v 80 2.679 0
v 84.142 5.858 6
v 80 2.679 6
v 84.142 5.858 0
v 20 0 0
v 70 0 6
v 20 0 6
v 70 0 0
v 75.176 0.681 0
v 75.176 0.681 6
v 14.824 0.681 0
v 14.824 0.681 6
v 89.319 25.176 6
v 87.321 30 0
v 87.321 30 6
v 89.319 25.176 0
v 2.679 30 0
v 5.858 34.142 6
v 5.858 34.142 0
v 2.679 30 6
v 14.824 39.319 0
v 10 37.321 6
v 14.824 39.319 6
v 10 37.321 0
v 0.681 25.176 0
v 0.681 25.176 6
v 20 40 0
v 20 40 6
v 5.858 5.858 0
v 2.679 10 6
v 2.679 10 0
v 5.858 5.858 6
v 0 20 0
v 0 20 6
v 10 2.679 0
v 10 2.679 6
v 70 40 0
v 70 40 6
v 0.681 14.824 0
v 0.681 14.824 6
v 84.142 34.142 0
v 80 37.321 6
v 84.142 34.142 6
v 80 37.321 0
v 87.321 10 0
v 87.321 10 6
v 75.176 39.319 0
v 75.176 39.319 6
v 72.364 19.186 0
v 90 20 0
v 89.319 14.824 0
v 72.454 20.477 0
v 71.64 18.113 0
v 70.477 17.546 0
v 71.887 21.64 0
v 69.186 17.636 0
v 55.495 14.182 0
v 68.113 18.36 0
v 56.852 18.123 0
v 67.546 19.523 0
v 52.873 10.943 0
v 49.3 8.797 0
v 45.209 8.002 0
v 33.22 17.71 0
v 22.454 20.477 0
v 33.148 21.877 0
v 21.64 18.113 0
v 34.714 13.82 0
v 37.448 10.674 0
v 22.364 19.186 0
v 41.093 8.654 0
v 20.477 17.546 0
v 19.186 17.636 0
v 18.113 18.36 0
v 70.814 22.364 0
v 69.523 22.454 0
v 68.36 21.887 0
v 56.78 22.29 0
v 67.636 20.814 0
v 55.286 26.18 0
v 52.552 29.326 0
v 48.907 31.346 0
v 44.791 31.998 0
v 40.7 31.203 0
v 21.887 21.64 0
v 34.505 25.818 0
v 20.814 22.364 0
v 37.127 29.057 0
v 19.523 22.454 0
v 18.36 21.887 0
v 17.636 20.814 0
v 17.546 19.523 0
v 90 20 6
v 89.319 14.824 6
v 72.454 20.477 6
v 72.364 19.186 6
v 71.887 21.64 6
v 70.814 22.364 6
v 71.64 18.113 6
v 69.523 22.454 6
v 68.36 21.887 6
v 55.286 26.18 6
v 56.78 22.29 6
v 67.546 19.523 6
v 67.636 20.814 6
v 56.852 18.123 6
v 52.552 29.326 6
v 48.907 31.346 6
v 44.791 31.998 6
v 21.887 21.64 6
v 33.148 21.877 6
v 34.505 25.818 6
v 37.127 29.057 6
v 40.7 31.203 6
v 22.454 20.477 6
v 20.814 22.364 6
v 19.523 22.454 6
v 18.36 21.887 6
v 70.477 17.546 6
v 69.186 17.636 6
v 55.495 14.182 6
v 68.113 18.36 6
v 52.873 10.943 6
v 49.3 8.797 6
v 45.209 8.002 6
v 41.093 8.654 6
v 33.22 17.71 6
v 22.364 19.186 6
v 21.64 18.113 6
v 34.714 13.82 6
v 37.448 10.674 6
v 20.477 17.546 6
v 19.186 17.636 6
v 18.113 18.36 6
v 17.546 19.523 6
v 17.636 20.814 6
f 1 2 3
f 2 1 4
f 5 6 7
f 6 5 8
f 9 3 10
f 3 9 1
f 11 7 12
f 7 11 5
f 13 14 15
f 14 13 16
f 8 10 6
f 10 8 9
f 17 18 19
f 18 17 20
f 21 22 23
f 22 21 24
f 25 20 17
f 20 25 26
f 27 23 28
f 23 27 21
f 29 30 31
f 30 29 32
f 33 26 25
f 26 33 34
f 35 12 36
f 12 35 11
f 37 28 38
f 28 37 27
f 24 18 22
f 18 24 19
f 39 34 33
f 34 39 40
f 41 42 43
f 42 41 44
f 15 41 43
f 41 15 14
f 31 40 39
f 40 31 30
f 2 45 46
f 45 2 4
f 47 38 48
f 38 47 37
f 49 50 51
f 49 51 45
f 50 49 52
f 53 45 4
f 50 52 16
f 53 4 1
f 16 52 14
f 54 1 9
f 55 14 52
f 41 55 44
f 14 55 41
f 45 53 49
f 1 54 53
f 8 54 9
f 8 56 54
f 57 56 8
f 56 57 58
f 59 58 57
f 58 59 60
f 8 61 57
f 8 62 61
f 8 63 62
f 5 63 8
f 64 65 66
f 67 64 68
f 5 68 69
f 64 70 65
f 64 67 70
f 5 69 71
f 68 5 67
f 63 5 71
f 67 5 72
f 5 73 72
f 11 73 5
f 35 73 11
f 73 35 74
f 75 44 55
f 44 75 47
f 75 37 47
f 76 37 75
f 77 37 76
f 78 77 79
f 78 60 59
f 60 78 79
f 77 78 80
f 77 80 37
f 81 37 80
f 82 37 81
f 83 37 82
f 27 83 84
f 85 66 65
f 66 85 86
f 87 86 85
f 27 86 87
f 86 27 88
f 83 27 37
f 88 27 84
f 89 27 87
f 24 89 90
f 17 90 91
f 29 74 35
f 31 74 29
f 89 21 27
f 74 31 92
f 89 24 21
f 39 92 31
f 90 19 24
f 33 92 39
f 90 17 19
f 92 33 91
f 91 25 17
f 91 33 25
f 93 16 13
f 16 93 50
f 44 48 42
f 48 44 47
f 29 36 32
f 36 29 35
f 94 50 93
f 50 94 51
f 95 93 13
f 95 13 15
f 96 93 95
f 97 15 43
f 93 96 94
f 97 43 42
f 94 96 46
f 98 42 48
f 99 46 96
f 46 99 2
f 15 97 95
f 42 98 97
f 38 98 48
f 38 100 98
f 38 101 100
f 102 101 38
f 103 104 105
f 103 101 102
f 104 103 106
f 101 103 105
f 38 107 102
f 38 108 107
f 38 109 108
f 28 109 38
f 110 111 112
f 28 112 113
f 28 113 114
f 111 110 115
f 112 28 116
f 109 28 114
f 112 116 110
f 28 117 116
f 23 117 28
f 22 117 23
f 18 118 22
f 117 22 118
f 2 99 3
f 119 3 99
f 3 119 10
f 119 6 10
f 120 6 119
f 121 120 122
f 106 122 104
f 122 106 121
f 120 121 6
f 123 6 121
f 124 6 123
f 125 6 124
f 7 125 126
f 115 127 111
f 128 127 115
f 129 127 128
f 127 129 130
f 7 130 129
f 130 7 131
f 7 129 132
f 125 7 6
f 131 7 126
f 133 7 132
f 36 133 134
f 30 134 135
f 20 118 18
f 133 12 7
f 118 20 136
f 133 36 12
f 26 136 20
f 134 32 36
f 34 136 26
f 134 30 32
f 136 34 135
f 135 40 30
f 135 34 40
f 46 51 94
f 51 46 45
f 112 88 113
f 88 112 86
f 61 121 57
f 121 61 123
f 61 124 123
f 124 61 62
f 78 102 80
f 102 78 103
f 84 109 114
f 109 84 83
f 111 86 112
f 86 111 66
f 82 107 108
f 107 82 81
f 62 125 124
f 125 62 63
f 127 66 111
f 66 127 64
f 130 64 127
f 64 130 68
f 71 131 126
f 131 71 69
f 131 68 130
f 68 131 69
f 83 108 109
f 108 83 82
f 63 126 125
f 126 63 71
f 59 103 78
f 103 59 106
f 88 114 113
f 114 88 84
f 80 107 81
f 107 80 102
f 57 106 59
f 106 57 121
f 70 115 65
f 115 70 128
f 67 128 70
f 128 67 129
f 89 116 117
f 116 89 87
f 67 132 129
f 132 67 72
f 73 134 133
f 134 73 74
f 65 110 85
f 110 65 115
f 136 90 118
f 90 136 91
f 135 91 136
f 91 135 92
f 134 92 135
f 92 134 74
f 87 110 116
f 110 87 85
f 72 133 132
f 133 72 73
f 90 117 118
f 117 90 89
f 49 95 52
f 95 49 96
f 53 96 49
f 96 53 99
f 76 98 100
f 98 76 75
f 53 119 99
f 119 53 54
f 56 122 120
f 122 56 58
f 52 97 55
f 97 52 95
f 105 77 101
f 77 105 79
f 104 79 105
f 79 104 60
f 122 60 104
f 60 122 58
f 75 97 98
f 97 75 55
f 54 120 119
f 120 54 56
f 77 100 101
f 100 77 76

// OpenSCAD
$fn = 32;

// ----------------------------------------------------------------------
// Spacer plate: obround span 50, caps R20
// ----------------------------------------------------------------------

// --- parameters (mm) ---
bore_r = 12;              // centre bore radius
bolt_r = 2.5;             // bolt hole radius
plate_t = 6;              // plate thickness, Z (extrusion height)
span = 50;                // obround span
cap_r = 20;               // cap radius

profile = [[20, 40], [14.824, 39.319], [10, 37.321], [5.858, 34.142], [2.679, 30], [0.681, 25.176], [0, 20], [0.681, 14.824], [2.679, 10], [5.858, 5.858], [10, 2.679], [14.824, 0.681], [20, 0], [70, 0], [75.176, 0.681], [80, 2.679], [84.142, 5.858], [87.321, 10], [89.319, 14.824], [90, 20], [89.319, 25.176], [87.321, 30], [84.142, 34.142], [80, 37.321], [75.176, 39.319], [70, 40]];  // primary outline, 26 points, counter clockwise
void_1 = [[56.78, 22.29], [55.286, 26.18], [52.552, 29.326], [48.907, 31.346], [44.791, 31.998], [40.7, 31.203], [37.127, 29.057], [34.505, 25.818], [33.148, 21.877], [33.22, 17.71], [34.714, 13.82], [37.448, 10.674], [41.093, 8.654], [45.209, 8.002], [49.3, 8.797], [52.873, 10.943], [55.495, 14.182], [56.852, 18.123]];  // centre bore, 18 points
void_2 = [[22.454, 20.477], [21.887, 21.64], [20.814, 22.364], [19.523, 22.454], [18.36, 21.887], [17.636, 20.814], [17.546, 19.523], [18.113, 18.36], [19.186, 17.636], [20.477, 17.546], [21.64, 18.113], [22.364, 19.186]];  // end hole, 12 points
void_3 = [[72.454, 20.477], [71.887, 21.64], [70.814, 22.364], [69.523, 22.454], [68.36, 21.887], [67.636, 20.814], [67.546, 19.523], [68.113, 18.36], [69.186, 17.636], [70.477, 17.546], [71.64, 18.113], [72.364, 19.186]];  // end hole, 12 points

// --- the one profile operation ---
difference() {
  linear_extrude(height = plate_t) polygon(points = profile);
  translate([0, 0, -1])
    linear_extrude(height = plate_t + 2) polygon(points = void_1);
  translate([0, 0, -1])
    linear_extrude(height = plate_t + 2) polygon(points = void_2);
  translate([0, 0, -1])
    linear_extrude(height = plate_t + 2) polygon(points = void_3);
}
